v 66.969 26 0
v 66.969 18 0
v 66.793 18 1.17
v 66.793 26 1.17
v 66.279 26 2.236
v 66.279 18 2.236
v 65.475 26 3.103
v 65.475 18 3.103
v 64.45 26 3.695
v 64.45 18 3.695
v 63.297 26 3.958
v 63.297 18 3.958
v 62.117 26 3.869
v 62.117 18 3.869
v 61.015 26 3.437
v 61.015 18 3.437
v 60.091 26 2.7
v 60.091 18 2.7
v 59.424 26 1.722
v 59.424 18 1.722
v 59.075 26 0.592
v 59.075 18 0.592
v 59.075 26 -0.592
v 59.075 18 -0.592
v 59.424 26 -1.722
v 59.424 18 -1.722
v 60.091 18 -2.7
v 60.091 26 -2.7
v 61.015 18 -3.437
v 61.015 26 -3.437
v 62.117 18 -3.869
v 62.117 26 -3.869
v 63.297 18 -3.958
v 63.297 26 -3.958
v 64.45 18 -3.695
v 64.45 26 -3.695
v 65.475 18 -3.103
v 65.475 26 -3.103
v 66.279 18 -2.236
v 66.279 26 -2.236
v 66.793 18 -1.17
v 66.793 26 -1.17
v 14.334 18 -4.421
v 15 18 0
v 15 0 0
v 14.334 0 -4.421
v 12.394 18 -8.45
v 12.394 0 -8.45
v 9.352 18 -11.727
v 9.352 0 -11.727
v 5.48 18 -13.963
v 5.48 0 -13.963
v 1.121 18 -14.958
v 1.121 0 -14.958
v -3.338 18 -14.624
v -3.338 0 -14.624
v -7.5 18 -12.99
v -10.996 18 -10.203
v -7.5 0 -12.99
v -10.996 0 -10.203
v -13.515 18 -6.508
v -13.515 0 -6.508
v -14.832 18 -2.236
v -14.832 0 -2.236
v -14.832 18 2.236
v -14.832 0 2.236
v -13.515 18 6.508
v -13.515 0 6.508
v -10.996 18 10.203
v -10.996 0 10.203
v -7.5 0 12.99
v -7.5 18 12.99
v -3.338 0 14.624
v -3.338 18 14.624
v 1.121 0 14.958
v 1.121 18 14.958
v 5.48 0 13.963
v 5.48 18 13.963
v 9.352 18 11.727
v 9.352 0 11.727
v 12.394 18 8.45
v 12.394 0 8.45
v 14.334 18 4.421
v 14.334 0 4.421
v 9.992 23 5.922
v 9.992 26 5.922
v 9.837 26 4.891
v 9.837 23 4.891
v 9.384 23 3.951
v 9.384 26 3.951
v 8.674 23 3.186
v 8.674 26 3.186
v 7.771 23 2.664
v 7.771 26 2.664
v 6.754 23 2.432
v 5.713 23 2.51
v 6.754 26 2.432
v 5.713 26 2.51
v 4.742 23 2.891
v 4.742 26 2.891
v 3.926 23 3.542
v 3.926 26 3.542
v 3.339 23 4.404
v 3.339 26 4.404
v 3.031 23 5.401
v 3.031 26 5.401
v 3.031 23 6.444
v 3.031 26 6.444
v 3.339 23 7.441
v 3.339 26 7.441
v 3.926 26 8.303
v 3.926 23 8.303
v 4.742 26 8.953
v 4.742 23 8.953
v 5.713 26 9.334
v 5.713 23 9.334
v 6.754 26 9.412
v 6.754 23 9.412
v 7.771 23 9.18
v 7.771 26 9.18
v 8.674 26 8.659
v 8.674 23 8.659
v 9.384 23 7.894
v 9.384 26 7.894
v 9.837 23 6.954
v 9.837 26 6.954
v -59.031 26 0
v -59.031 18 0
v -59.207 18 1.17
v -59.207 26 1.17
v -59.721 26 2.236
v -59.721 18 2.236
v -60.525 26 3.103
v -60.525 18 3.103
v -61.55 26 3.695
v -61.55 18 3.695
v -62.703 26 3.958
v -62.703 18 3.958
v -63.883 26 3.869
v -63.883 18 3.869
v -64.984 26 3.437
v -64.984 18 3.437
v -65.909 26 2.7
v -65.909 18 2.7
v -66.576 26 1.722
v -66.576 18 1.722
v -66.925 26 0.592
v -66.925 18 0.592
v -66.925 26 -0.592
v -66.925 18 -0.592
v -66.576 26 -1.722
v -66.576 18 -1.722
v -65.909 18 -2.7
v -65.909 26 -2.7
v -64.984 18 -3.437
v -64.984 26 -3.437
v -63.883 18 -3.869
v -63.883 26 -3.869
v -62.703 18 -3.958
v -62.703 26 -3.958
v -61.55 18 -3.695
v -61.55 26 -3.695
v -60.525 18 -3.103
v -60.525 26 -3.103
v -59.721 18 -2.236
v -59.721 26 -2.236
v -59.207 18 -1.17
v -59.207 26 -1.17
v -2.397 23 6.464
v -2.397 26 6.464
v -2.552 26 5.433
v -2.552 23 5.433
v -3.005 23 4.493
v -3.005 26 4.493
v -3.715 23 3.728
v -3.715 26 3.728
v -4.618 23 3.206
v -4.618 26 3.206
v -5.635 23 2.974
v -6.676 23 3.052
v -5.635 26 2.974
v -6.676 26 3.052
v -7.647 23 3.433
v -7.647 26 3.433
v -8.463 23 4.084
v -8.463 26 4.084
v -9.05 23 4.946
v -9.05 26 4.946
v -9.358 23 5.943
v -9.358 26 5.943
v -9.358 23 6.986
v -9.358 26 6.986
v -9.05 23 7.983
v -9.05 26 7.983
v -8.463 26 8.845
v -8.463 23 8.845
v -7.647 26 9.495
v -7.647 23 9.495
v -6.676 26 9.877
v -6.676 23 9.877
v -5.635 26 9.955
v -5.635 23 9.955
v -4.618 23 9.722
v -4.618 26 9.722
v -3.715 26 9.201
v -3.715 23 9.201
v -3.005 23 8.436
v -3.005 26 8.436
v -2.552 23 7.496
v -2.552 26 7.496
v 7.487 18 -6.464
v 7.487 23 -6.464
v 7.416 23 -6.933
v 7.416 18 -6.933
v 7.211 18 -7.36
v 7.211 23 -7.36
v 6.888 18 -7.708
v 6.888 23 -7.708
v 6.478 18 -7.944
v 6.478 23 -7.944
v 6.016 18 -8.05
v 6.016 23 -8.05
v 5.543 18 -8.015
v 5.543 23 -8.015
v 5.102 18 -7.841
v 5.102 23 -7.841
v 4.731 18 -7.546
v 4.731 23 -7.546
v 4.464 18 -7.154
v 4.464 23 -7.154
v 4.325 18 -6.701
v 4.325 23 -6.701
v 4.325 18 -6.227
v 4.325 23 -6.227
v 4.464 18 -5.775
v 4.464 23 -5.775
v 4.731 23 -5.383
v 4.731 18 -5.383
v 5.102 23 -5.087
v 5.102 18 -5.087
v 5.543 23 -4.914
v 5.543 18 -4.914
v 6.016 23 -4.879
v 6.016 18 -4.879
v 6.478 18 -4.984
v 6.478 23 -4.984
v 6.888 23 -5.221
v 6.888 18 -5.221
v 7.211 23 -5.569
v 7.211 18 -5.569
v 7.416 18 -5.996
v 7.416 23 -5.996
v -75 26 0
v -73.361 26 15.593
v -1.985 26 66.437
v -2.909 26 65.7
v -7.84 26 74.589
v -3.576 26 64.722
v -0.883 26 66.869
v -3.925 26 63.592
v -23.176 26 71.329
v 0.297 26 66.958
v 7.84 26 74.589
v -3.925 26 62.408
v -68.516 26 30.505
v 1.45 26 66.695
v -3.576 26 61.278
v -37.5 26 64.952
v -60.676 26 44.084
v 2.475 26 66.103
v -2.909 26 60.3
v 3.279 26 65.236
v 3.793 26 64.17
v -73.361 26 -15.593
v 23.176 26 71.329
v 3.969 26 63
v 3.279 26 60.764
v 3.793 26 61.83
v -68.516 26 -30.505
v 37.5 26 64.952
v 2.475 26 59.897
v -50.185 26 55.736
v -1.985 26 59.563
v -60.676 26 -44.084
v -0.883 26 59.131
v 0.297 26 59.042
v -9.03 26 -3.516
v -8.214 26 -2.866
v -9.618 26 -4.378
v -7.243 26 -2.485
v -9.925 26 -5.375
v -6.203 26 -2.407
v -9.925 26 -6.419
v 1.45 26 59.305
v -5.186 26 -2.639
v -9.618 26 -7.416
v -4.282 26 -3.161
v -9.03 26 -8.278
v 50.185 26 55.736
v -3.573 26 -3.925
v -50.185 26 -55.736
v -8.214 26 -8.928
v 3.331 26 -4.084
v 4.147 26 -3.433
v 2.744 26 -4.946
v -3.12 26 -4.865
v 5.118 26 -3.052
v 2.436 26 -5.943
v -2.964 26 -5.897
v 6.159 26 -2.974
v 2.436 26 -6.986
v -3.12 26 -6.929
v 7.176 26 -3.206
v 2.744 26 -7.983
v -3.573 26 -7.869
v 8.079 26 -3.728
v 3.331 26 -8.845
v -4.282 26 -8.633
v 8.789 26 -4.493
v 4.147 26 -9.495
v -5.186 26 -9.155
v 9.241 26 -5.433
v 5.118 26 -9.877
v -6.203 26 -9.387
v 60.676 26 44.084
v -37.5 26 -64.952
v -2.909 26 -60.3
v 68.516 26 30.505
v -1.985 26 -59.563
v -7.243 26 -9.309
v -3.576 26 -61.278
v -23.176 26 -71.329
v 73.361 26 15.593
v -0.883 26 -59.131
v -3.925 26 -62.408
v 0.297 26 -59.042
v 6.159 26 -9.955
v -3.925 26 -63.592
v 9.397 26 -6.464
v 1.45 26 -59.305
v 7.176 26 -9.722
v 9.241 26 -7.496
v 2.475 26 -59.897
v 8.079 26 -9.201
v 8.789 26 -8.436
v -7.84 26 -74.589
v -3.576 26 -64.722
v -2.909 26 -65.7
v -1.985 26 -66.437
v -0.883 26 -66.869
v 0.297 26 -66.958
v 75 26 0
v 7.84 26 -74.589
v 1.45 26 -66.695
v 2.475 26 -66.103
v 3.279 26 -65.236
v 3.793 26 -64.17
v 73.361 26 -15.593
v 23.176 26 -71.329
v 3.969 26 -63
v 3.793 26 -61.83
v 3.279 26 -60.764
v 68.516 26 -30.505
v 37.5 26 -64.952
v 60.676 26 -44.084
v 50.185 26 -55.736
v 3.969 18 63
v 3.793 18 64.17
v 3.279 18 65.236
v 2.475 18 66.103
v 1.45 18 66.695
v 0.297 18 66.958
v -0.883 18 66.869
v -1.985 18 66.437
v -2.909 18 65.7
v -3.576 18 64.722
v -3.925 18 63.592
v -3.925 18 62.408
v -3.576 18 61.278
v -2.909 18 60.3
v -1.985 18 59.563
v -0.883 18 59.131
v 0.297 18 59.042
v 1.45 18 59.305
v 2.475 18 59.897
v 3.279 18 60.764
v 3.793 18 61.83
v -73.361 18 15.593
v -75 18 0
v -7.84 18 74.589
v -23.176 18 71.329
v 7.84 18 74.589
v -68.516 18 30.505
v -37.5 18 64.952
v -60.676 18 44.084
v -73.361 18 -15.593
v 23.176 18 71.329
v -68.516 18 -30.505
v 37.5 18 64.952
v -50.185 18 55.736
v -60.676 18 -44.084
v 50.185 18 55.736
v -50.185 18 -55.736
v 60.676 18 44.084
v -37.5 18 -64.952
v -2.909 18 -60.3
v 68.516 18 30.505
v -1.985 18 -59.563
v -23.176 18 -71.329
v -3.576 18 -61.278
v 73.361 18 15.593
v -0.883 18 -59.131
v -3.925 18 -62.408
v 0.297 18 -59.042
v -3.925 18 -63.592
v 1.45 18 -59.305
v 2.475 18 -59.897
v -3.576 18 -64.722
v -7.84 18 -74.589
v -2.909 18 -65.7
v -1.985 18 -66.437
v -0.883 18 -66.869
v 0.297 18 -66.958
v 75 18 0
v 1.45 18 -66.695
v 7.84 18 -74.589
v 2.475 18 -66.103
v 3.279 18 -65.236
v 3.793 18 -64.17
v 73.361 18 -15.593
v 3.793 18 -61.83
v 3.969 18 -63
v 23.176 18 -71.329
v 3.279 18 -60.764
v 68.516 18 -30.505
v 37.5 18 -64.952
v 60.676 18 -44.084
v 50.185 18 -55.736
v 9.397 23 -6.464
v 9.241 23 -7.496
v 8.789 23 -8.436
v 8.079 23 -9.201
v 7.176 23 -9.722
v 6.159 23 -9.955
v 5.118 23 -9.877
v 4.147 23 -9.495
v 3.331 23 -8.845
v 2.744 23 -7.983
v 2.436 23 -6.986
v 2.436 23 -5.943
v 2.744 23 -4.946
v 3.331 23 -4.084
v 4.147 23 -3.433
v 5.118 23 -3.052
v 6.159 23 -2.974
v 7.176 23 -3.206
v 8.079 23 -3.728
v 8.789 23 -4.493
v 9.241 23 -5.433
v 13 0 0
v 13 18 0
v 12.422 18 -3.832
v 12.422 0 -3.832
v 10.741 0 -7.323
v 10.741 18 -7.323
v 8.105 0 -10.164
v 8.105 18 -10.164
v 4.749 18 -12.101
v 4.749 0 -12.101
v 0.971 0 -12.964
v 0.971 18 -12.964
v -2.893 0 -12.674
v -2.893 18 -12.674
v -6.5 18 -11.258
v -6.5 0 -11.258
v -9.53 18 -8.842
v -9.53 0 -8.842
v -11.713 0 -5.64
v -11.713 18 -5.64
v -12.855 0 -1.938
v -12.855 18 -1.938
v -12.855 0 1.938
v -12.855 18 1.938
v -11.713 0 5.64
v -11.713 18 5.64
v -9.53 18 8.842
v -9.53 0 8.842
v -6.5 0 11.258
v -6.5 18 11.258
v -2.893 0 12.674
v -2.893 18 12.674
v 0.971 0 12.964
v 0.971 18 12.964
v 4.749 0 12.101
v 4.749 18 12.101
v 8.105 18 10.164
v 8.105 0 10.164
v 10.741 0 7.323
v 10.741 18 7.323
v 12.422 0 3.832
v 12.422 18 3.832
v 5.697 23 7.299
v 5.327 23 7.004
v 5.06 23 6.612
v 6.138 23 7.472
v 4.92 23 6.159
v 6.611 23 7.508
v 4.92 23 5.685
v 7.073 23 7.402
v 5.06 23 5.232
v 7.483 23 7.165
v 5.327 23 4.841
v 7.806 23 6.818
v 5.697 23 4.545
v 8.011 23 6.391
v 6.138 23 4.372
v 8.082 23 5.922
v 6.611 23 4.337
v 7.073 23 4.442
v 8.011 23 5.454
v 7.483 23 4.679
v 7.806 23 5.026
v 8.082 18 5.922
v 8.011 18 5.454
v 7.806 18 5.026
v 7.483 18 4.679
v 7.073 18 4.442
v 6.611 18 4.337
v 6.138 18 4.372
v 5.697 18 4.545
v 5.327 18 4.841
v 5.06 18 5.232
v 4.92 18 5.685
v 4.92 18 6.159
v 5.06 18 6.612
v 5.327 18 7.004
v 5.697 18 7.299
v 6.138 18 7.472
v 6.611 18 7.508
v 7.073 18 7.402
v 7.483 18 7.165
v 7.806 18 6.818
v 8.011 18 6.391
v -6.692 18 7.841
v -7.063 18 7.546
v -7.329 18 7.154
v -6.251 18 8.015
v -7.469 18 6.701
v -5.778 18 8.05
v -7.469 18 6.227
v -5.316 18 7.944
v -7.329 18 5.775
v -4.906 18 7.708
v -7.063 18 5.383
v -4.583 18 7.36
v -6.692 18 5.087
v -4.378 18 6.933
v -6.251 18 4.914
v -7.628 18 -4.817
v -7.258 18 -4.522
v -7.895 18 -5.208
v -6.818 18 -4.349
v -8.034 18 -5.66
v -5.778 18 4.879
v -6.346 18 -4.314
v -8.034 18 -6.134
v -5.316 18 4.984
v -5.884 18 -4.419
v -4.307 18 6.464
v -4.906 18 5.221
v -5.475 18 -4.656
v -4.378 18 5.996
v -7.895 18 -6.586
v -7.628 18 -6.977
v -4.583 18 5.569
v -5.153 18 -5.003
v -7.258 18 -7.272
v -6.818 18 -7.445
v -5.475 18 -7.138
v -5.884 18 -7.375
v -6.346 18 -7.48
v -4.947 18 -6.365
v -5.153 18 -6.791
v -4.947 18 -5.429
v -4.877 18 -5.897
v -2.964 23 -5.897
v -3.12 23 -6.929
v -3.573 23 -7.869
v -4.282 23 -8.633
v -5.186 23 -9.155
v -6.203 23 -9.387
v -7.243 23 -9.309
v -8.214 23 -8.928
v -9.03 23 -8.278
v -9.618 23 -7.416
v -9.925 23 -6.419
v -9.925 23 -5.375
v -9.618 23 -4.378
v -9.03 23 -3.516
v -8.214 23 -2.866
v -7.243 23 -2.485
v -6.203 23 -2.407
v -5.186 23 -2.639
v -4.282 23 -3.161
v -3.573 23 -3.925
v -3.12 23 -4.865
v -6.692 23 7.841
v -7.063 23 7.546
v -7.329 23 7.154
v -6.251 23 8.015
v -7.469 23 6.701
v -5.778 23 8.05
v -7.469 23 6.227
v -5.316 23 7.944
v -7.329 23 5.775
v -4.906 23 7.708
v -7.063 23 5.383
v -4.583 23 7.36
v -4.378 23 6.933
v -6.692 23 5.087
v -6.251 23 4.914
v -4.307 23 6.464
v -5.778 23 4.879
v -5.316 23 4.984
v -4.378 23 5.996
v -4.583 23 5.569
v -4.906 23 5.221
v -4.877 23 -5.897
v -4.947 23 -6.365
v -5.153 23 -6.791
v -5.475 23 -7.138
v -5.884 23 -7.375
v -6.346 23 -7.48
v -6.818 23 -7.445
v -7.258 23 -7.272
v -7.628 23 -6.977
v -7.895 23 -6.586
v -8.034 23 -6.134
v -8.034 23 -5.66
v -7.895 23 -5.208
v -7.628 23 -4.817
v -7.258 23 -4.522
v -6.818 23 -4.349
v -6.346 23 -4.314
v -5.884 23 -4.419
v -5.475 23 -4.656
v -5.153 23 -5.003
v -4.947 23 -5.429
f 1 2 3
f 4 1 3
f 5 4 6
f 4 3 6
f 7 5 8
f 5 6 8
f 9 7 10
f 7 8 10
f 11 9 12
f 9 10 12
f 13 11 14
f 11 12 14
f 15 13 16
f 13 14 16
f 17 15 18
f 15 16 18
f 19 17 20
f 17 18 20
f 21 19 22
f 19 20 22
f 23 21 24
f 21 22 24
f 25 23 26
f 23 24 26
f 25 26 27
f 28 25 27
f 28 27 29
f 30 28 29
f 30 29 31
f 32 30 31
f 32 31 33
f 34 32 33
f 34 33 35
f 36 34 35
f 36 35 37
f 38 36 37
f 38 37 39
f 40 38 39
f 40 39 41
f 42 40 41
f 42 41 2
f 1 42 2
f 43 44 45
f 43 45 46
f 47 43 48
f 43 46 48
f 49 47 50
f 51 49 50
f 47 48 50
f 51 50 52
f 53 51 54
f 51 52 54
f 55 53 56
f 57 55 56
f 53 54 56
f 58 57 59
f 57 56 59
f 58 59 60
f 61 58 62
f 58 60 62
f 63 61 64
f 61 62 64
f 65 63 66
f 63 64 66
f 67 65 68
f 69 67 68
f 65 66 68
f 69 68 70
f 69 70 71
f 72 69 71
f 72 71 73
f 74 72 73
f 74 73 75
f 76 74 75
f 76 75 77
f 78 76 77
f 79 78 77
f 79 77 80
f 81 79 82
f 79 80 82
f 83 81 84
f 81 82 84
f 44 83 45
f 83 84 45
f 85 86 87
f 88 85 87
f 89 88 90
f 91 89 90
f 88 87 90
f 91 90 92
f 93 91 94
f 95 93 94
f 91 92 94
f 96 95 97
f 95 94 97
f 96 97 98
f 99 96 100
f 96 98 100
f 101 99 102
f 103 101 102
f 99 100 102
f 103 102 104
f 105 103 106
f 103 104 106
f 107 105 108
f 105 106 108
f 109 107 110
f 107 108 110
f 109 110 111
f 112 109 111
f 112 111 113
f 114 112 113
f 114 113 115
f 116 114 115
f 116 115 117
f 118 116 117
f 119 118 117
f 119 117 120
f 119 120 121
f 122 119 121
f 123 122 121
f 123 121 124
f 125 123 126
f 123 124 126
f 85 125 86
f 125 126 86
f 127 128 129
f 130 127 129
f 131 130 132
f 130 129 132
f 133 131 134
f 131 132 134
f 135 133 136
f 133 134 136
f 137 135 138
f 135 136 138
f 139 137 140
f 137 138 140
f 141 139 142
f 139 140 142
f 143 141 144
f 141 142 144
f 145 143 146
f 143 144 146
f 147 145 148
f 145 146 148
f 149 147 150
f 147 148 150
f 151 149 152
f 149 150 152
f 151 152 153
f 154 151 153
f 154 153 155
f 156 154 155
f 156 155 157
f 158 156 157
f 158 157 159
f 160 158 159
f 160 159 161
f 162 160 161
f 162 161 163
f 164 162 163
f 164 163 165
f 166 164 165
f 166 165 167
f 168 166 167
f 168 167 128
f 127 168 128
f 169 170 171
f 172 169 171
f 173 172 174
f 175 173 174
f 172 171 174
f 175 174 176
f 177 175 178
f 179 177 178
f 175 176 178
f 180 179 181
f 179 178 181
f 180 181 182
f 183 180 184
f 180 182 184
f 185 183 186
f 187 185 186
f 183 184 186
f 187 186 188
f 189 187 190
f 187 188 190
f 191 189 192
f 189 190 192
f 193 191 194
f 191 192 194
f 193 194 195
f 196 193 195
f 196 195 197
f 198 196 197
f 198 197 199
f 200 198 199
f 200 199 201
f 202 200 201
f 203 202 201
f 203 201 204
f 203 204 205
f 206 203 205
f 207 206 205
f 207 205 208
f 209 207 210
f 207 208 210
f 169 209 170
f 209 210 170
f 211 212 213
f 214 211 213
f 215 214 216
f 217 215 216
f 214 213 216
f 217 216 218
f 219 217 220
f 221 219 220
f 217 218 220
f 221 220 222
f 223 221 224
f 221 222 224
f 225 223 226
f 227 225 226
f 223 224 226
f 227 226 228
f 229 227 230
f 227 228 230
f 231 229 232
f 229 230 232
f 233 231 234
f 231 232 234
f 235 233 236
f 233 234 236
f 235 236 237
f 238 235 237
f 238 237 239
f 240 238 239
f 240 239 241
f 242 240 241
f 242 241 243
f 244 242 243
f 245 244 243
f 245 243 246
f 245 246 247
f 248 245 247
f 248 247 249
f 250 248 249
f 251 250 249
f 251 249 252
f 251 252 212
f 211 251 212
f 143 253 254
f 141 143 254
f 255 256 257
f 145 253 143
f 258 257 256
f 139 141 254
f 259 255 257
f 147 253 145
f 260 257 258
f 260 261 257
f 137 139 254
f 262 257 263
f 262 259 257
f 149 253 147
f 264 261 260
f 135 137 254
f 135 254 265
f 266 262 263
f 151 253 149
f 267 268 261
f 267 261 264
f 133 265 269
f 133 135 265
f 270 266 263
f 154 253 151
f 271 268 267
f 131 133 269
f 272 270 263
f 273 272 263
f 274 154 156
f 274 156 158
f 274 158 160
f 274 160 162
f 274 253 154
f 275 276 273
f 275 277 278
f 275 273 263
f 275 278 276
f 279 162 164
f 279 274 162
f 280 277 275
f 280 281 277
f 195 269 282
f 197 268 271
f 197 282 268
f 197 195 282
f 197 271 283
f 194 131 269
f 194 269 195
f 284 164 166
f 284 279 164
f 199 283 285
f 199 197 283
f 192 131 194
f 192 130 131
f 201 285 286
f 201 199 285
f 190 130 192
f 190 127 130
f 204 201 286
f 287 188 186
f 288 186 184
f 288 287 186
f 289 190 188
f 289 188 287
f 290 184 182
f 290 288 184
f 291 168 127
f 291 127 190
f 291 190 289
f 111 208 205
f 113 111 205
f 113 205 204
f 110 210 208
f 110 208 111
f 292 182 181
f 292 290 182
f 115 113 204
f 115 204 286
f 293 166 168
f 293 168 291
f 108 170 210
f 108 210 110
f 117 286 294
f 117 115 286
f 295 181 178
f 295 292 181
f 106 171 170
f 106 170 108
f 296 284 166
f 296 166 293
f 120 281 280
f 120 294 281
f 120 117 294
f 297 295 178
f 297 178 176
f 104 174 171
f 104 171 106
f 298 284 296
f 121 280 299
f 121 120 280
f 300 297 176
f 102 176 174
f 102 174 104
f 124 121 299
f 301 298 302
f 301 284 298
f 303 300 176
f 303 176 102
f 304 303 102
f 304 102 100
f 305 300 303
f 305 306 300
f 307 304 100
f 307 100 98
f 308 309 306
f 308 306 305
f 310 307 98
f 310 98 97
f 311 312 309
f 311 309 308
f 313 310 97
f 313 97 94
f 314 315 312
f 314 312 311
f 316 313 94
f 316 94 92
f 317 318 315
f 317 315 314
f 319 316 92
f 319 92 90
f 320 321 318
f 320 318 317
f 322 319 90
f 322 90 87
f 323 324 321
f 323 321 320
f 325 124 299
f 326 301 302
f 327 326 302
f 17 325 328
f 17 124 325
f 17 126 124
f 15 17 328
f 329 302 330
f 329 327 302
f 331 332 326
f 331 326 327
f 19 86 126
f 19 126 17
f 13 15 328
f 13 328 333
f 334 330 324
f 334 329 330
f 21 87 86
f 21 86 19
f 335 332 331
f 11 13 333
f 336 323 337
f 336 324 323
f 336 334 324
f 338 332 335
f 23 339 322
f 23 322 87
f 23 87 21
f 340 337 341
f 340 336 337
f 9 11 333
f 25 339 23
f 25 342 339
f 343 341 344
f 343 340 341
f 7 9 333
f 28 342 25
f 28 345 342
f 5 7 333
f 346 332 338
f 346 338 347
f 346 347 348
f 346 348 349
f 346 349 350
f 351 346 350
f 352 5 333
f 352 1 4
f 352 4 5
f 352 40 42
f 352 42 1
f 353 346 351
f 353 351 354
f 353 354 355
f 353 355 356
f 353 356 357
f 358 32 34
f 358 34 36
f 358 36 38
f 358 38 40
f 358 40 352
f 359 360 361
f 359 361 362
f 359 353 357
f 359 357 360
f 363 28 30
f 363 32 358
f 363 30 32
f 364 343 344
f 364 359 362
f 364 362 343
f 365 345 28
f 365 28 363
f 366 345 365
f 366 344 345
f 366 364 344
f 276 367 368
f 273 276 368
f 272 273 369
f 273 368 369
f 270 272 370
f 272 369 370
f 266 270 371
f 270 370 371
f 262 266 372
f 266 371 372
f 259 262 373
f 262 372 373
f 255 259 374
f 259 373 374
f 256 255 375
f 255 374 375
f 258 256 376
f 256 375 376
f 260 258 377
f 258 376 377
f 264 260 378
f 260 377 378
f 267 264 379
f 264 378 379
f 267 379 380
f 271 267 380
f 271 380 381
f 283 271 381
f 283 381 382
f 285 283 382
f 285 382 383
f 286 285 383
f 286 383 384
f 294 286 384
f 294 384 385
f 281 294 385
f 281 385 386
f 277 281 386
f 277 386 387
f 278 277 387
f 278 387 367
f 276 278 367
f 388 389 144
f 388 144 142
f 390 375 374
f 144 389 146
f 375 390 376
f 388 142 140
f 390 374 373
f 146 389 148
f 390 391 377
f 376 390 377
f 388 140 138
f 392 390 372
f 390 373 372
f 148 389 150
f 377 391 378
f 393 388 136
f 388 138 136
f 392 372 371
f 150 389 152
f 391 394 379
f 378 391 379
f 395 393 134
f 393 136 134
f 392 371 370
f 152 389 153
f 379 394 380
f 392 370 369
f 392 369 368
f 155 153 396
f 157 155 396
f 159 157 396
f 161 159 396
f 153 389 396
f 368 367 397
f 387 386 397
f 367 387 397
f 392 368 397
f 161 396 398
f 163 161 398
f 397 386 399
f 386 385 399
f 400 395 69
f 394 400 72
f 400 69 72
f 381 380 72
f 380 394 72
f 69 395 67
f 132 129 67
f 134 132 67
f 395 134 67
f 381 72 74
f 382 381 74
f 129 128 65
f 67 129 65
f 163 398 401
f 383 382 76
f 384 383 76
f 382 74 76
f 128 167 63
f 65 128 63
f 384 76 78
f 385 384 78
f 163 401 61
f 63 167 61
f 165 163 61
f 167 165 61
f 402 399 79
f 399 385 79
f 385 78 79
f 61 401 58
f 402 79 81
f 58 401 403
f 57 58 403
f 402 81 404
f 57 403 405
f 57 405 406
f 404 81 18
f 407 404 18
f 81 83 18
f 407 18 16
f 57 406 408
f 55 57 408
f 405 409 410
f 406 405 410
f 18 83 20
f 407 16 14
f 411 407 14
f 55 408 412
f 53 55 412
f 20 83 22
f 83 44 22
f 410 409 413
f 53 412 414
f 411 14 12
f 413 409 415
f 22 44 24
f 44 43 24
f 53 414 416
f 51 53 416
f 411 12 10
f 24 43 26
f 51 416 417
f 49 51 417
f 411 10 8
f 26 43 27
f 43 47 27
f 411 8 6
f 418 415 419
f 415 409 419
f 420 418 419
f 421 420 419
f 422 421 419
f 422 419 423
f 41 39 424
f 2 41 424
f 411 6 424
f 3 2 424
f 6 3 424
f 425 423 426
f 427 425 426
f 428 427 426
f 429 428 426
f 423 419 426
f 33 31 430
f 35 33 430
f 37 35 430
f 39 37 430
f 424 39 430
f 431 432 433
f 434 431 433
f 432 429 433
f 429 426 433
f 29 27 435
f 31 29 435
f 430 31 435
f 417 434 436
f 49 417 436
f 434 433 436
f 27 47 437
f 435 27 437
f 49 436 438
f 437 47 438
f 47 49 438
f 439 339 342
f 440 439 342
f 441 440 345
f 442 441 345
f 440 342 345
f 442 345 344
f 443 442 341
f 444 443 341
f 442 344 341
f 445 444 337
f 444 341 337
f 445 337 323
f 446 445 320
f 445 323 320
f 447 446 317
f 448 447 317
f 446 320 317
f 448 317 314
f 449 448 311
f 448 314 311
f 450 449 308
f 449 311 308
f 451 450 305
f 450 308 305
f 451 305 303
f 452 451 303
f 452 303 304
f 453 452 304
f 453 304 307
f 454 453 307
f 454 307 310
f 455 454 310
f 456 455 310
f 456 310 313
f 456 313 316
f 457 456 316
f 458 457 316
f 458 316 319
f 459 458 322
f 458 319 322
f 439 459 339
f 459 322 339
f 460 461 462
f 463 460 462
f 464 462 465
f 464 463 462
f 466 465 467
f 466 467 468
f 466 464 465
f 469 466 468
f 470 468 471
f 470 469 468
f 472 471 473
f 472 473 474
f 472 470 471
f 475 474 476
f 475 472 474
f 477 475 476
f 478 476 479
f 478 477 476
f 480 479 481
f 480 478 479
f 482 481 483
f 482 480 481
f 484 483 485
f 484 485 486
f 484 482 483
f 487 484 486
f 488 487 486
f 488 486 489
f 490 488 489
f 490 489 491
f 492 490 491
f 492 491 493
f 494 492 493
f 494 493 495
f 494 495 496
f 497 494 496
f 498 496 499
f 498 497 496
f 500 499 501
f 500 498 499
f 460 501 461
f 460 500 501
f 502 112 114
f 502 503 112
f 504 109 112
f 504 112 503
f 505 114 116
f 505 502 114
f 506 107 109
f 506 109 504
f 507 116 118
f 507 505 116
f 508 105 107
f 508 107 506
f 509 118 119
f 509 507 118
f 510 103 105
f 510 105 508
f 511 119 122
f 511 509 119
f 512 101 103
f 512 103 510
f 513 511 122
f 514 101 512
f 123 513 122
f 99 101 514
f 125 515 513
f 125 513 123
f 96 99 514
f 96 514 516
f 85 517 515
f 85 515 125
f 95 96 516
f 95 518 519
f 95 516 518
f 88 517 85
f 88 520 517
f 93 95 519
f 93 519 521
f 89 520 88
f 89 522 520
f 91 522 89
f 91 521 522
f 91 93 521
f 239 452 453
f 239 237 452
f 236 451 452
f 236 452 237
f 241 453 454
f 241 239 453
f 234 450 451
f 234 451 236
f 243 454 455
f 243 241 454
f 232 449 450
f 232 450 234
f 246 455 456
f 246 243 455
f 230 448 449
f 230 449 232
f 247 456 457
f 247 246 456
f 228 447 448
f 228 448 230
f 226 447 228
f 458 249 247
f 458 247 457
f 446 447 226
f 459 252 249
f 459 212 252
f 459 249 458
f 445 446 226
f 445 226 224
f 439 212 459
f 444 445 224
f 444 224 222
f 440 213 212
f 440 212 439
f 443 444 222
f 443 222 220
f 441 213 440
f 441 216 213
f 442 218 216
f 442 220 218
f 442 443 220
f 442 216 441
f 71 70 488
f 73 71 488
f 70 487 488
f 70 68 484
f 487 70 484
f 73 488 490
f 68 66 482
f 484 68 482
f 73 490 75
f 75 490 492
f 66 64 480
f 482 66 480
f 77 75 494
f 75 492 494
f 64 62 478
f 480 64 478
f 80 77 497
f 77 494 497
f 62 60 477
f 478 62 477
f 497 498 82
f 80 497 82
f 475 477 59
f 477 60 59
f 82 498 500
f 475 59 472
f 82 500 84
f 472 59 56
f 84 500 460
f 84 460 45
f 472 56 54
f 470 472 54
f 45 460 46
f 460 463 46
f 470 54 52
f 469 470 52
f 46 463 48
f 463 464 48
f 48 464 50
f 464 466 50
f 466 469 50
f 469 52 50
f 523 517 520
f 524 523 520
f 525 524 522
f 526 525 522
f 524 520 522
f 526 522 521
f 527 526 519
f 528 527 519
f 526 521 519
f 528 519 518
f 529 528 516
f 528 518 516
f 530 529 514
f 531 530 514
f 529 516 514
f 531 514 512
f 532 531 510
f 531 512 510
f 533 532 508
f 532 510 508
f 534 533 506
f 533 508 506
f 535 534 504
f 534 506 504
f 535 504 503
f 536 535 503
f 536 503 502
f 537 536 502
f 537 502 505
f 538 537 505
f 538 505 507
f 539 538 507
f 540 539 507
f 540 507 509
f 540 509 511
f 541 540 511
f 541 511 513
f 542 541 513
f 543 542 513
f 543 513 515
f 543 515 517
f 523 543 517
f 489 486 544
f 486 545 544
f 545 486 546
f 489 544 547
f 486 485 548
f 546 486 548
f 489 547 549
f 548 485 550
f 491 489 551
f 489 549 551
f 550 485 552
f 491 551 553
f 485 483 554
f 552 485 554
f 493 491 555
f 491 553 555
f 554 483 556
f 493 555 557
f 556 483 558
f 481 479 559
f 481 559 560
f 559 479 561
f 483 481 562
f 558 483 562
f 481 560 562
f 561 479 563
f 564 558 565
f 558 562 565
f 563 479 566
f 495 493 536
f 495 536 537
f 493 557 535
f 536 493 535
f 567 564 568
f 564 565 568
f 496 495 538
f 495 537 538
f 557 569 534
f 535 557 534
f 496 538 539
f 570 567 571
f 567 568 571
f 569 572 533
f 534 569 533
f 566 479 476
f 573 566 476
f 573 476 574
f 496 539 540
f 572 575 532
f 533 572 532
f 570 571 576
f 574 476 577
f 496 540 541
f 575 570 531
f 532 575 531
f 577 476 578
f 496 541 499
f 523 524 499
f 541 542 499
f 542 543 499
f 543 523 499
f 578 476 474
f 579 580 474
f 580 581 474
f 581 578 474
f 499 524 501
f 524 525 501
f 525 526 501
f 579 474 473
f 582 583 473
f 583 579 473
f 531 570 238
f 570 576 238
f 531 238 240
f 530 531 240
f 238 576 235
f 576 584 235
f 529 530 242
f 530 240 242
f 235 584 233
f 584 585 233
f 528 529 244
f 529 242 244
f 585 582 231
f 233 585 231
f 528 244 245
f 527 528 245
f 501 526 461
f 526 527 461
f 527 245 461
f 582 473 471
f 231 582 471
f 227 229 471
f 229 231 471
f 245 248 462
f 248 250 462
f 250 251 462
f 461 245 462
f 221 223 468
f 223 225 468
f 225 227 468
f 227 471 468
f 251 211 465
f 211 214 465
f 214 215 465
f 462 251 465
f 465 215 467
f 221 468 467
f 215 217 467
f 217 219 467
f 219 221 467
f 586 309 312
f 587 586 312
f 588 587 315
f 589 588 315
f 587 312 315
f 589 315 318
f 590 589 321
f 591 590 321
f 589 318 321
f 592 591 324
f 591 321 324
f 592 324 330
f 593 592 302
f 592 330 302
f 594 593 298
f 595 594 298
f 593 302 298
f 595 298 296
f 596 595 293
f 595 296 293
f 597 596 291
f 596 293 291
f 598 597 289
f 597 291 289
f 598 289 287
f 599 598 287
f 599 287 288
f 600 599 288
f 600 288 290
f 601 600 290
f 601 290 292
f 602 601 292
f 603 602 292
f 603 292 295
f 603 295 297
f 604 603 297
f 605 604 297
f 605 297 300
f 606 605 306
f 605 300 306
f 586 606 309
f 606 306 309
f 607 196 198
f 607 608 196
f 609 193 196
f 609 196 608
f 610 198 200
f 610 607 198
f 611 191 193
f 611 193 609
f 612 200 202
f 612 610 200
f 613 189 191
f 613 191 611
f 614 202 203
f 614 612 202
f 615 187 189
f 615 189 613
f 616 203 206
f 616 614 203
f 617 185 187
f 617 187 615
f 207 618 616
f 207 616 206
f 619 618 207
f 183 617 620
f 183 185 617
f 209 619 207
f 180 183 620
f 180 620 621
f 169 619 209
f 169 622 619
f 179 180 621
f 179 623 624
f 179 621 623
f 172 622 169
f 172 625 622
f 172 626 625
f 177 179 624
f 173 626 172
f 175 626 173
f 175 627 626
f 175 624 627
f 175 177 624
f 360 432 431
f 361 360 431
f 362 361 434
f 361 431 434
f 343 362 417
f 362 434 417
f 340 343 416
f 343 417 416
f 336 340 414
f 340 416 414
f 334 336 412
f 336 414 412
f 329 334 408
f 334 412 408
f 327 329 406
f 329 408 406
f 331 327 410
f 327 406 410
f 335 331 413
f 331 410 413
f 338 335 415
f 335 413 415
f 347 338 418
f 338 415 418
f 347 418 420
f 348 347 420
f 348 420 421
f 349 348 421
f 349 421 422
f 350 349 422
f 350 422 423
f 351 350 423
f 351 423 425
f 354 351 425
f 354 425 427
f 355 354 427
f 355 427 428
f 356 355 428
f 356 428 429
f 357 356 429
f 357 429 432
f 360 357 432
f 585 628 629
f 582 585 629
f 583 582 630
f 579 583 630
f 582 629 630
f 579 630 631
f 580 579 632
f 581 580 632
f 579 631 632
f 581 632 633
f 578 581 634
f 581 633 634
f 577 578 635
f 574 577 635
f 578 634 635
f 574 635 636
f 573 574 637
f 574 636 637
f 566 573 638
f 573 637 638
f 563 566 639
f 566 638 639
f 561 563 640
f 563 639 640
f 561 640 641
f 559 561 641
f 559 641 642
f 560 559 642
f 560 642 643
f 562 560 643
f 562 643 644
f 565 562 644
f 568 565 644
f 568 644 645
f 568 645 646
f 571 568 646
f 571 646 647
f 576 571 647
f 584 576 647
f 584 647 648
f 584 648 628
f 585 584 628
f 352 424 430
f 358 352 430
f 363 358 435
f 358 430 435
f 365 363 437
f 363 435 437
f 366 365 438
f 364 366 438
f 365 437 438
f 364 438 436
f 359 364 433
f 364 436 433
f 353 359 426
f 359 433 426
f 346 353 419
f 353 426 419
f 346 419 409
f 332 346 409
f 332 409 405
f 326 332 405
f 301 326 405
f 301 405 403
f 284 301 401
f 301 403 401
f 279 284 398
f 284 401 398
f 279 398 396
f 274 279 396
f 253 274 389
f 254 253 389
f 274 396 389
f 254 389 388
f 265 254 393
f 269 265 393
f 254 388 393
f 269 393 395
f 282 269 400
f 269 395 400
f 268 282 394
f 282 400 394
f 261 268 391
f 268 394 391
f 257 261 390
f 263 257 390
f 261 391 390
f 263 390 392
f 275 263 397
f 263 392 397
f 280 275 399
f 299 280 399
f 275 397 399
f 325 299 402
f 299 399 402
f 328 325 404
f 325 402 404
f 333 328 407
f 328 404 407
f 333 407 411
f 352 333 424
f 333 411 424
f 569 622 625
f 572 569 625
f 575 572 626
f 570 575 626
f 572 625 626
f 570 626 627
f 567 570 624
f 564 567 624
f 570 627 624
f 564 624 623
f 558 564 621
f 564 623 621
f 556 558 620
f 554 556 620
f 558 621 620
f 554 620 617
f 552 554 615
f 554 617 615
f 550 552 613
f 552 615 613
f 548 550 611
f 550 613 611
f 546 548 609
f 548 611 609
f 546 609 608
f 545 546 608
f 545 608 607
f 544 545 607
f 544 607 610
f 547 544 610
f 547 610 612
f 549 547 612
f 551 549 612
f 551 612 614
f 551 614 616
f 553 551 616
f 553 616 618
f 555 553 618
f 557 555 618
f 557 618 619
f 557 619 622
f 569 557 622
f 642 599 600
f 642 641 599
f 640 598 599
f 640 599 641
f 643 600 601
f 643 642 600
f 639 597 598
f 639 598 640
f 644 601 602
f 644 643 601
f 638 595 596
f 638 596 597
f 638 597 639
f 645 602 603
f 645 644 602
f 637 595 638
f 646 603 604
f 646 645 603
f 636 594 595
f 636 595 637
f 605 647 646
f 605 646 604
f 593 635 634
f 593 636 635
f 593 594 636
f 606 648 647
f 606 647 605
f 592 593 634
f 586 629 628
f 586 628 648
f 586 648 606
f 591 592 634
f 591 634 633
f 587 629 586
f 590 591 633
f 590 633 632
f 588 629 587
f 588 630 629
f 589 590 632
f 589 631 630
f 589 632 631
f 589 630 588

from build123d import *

# Parameters (mm, degrees)
CROQUIS1_R              = 15
CROQUIS1_R_2            = 13
EXTRUIR_L_MINA1_DEPTH   = 18
CROQUIS2_R              = 75
SALIENTE_EXTRUIR1_DEPTH = 8
CROQUIS3_R              = 1.59
CROQUIS3_R_2            = 1.5875
CORTAR_EXTRUIR1_DEPTH   = 10
CROQUIS5_R              = 3.969
CORTAR_EXTRUIR2_DEPTH   = 10
CROQUIS6_R              = 3.5
CORTAR_EXTRUIR3_DEPTH   = 3


with BuildPart() as part:
    # Croquis1 → Extruir-Lámina1 (new body)
    with BuildSketch(Plane(origin=(0, 0, 0), x_dir=(1, 0, 0), z_dir=(0, 1, 0))):
        Circle(CROQUIS1_R)
        Circle(CROQUIS1_R_2, mode=Mode.SUBTRACT)
    extrude(amount=EXTRUIR_L_MINA1_DEPTH)

    # Croquis2 → Saliente-Extruir1 (add)
    with BuildSketch(Plane(origin=(0, 18, 0), x_dir=(1, 0, 0), z_dir=(0, 1, 0))):
        Circle(CROQUIS2_R)
    extrude(amount=SALIENTE_EXTRUIR1_DEPTH)

    # Croquis3 → Cortar-Extruir1 (cut)
    with BuildSketch(Plane(origin=(0, 26, 0), x_dir=(1, 0, 0), z_dir=(0, 1, 0))):
        with Locations((5.896947673, 6.464403154)):
            Circle(CROQUIS3_R)
        with Locations((-5.896947673, -6.464403154)):
            Circle(CROQUIS3_R)
        with Locations((6.492053366, -5.922170706)):
            Circle(CROQUIS3_R)
        with Locations((-6.464403154, 5.896947673)):
            Circle(CROQUIS3_R_2)
    extrude(amount=-CORTAR_EXTRUIR1_DEPTH, mode=Mode.SUBTRACT)

    # Croquis5 → Cortar-Extruir2 (cut)
    with BuildSketch(Plane.XZ.offset(-18)):
        with Locations((0, -63)):
            Circle(CROQUIS5_R)
        with Locations((-63, 0)):
            Circle(CROQUIS5_R)
        with Locations((0, 63)):
            Circle(CROQUIS5_R)
        with Locations((63, 0)):
            Circle(CROQUIS5_R)
    extrude(amount=-CORTAR_EXTRUIR2_DEPTH, mode=Mode.SUBTRACT)

    # Croquis6 → Cortar-Extruir3 (cut)
    with BuildSketch(Plane(origin=(0, 26, 0), x_dir=(1, 0, 0), z_dir=(0, 1, 0))):
        with Locations((5.896947673, 6.464403154)):
            Circle(CROQUIS6_R)
        with Locations((-6.464403154, 5.896947673)):
            Circle(CROQUIS6_R)
        with Locations((-5.896947673, -6.464403154)):
            Circle(CROQUIS6_R)
        with Locations((6.492053366, -5.922170706)):
            Circle(CROQUIS6_R)
    extrude(amount=-CORTAR_EXTRUIR3_DEPTH, mode=Mode.SUBTRACT)


solid = part.part
